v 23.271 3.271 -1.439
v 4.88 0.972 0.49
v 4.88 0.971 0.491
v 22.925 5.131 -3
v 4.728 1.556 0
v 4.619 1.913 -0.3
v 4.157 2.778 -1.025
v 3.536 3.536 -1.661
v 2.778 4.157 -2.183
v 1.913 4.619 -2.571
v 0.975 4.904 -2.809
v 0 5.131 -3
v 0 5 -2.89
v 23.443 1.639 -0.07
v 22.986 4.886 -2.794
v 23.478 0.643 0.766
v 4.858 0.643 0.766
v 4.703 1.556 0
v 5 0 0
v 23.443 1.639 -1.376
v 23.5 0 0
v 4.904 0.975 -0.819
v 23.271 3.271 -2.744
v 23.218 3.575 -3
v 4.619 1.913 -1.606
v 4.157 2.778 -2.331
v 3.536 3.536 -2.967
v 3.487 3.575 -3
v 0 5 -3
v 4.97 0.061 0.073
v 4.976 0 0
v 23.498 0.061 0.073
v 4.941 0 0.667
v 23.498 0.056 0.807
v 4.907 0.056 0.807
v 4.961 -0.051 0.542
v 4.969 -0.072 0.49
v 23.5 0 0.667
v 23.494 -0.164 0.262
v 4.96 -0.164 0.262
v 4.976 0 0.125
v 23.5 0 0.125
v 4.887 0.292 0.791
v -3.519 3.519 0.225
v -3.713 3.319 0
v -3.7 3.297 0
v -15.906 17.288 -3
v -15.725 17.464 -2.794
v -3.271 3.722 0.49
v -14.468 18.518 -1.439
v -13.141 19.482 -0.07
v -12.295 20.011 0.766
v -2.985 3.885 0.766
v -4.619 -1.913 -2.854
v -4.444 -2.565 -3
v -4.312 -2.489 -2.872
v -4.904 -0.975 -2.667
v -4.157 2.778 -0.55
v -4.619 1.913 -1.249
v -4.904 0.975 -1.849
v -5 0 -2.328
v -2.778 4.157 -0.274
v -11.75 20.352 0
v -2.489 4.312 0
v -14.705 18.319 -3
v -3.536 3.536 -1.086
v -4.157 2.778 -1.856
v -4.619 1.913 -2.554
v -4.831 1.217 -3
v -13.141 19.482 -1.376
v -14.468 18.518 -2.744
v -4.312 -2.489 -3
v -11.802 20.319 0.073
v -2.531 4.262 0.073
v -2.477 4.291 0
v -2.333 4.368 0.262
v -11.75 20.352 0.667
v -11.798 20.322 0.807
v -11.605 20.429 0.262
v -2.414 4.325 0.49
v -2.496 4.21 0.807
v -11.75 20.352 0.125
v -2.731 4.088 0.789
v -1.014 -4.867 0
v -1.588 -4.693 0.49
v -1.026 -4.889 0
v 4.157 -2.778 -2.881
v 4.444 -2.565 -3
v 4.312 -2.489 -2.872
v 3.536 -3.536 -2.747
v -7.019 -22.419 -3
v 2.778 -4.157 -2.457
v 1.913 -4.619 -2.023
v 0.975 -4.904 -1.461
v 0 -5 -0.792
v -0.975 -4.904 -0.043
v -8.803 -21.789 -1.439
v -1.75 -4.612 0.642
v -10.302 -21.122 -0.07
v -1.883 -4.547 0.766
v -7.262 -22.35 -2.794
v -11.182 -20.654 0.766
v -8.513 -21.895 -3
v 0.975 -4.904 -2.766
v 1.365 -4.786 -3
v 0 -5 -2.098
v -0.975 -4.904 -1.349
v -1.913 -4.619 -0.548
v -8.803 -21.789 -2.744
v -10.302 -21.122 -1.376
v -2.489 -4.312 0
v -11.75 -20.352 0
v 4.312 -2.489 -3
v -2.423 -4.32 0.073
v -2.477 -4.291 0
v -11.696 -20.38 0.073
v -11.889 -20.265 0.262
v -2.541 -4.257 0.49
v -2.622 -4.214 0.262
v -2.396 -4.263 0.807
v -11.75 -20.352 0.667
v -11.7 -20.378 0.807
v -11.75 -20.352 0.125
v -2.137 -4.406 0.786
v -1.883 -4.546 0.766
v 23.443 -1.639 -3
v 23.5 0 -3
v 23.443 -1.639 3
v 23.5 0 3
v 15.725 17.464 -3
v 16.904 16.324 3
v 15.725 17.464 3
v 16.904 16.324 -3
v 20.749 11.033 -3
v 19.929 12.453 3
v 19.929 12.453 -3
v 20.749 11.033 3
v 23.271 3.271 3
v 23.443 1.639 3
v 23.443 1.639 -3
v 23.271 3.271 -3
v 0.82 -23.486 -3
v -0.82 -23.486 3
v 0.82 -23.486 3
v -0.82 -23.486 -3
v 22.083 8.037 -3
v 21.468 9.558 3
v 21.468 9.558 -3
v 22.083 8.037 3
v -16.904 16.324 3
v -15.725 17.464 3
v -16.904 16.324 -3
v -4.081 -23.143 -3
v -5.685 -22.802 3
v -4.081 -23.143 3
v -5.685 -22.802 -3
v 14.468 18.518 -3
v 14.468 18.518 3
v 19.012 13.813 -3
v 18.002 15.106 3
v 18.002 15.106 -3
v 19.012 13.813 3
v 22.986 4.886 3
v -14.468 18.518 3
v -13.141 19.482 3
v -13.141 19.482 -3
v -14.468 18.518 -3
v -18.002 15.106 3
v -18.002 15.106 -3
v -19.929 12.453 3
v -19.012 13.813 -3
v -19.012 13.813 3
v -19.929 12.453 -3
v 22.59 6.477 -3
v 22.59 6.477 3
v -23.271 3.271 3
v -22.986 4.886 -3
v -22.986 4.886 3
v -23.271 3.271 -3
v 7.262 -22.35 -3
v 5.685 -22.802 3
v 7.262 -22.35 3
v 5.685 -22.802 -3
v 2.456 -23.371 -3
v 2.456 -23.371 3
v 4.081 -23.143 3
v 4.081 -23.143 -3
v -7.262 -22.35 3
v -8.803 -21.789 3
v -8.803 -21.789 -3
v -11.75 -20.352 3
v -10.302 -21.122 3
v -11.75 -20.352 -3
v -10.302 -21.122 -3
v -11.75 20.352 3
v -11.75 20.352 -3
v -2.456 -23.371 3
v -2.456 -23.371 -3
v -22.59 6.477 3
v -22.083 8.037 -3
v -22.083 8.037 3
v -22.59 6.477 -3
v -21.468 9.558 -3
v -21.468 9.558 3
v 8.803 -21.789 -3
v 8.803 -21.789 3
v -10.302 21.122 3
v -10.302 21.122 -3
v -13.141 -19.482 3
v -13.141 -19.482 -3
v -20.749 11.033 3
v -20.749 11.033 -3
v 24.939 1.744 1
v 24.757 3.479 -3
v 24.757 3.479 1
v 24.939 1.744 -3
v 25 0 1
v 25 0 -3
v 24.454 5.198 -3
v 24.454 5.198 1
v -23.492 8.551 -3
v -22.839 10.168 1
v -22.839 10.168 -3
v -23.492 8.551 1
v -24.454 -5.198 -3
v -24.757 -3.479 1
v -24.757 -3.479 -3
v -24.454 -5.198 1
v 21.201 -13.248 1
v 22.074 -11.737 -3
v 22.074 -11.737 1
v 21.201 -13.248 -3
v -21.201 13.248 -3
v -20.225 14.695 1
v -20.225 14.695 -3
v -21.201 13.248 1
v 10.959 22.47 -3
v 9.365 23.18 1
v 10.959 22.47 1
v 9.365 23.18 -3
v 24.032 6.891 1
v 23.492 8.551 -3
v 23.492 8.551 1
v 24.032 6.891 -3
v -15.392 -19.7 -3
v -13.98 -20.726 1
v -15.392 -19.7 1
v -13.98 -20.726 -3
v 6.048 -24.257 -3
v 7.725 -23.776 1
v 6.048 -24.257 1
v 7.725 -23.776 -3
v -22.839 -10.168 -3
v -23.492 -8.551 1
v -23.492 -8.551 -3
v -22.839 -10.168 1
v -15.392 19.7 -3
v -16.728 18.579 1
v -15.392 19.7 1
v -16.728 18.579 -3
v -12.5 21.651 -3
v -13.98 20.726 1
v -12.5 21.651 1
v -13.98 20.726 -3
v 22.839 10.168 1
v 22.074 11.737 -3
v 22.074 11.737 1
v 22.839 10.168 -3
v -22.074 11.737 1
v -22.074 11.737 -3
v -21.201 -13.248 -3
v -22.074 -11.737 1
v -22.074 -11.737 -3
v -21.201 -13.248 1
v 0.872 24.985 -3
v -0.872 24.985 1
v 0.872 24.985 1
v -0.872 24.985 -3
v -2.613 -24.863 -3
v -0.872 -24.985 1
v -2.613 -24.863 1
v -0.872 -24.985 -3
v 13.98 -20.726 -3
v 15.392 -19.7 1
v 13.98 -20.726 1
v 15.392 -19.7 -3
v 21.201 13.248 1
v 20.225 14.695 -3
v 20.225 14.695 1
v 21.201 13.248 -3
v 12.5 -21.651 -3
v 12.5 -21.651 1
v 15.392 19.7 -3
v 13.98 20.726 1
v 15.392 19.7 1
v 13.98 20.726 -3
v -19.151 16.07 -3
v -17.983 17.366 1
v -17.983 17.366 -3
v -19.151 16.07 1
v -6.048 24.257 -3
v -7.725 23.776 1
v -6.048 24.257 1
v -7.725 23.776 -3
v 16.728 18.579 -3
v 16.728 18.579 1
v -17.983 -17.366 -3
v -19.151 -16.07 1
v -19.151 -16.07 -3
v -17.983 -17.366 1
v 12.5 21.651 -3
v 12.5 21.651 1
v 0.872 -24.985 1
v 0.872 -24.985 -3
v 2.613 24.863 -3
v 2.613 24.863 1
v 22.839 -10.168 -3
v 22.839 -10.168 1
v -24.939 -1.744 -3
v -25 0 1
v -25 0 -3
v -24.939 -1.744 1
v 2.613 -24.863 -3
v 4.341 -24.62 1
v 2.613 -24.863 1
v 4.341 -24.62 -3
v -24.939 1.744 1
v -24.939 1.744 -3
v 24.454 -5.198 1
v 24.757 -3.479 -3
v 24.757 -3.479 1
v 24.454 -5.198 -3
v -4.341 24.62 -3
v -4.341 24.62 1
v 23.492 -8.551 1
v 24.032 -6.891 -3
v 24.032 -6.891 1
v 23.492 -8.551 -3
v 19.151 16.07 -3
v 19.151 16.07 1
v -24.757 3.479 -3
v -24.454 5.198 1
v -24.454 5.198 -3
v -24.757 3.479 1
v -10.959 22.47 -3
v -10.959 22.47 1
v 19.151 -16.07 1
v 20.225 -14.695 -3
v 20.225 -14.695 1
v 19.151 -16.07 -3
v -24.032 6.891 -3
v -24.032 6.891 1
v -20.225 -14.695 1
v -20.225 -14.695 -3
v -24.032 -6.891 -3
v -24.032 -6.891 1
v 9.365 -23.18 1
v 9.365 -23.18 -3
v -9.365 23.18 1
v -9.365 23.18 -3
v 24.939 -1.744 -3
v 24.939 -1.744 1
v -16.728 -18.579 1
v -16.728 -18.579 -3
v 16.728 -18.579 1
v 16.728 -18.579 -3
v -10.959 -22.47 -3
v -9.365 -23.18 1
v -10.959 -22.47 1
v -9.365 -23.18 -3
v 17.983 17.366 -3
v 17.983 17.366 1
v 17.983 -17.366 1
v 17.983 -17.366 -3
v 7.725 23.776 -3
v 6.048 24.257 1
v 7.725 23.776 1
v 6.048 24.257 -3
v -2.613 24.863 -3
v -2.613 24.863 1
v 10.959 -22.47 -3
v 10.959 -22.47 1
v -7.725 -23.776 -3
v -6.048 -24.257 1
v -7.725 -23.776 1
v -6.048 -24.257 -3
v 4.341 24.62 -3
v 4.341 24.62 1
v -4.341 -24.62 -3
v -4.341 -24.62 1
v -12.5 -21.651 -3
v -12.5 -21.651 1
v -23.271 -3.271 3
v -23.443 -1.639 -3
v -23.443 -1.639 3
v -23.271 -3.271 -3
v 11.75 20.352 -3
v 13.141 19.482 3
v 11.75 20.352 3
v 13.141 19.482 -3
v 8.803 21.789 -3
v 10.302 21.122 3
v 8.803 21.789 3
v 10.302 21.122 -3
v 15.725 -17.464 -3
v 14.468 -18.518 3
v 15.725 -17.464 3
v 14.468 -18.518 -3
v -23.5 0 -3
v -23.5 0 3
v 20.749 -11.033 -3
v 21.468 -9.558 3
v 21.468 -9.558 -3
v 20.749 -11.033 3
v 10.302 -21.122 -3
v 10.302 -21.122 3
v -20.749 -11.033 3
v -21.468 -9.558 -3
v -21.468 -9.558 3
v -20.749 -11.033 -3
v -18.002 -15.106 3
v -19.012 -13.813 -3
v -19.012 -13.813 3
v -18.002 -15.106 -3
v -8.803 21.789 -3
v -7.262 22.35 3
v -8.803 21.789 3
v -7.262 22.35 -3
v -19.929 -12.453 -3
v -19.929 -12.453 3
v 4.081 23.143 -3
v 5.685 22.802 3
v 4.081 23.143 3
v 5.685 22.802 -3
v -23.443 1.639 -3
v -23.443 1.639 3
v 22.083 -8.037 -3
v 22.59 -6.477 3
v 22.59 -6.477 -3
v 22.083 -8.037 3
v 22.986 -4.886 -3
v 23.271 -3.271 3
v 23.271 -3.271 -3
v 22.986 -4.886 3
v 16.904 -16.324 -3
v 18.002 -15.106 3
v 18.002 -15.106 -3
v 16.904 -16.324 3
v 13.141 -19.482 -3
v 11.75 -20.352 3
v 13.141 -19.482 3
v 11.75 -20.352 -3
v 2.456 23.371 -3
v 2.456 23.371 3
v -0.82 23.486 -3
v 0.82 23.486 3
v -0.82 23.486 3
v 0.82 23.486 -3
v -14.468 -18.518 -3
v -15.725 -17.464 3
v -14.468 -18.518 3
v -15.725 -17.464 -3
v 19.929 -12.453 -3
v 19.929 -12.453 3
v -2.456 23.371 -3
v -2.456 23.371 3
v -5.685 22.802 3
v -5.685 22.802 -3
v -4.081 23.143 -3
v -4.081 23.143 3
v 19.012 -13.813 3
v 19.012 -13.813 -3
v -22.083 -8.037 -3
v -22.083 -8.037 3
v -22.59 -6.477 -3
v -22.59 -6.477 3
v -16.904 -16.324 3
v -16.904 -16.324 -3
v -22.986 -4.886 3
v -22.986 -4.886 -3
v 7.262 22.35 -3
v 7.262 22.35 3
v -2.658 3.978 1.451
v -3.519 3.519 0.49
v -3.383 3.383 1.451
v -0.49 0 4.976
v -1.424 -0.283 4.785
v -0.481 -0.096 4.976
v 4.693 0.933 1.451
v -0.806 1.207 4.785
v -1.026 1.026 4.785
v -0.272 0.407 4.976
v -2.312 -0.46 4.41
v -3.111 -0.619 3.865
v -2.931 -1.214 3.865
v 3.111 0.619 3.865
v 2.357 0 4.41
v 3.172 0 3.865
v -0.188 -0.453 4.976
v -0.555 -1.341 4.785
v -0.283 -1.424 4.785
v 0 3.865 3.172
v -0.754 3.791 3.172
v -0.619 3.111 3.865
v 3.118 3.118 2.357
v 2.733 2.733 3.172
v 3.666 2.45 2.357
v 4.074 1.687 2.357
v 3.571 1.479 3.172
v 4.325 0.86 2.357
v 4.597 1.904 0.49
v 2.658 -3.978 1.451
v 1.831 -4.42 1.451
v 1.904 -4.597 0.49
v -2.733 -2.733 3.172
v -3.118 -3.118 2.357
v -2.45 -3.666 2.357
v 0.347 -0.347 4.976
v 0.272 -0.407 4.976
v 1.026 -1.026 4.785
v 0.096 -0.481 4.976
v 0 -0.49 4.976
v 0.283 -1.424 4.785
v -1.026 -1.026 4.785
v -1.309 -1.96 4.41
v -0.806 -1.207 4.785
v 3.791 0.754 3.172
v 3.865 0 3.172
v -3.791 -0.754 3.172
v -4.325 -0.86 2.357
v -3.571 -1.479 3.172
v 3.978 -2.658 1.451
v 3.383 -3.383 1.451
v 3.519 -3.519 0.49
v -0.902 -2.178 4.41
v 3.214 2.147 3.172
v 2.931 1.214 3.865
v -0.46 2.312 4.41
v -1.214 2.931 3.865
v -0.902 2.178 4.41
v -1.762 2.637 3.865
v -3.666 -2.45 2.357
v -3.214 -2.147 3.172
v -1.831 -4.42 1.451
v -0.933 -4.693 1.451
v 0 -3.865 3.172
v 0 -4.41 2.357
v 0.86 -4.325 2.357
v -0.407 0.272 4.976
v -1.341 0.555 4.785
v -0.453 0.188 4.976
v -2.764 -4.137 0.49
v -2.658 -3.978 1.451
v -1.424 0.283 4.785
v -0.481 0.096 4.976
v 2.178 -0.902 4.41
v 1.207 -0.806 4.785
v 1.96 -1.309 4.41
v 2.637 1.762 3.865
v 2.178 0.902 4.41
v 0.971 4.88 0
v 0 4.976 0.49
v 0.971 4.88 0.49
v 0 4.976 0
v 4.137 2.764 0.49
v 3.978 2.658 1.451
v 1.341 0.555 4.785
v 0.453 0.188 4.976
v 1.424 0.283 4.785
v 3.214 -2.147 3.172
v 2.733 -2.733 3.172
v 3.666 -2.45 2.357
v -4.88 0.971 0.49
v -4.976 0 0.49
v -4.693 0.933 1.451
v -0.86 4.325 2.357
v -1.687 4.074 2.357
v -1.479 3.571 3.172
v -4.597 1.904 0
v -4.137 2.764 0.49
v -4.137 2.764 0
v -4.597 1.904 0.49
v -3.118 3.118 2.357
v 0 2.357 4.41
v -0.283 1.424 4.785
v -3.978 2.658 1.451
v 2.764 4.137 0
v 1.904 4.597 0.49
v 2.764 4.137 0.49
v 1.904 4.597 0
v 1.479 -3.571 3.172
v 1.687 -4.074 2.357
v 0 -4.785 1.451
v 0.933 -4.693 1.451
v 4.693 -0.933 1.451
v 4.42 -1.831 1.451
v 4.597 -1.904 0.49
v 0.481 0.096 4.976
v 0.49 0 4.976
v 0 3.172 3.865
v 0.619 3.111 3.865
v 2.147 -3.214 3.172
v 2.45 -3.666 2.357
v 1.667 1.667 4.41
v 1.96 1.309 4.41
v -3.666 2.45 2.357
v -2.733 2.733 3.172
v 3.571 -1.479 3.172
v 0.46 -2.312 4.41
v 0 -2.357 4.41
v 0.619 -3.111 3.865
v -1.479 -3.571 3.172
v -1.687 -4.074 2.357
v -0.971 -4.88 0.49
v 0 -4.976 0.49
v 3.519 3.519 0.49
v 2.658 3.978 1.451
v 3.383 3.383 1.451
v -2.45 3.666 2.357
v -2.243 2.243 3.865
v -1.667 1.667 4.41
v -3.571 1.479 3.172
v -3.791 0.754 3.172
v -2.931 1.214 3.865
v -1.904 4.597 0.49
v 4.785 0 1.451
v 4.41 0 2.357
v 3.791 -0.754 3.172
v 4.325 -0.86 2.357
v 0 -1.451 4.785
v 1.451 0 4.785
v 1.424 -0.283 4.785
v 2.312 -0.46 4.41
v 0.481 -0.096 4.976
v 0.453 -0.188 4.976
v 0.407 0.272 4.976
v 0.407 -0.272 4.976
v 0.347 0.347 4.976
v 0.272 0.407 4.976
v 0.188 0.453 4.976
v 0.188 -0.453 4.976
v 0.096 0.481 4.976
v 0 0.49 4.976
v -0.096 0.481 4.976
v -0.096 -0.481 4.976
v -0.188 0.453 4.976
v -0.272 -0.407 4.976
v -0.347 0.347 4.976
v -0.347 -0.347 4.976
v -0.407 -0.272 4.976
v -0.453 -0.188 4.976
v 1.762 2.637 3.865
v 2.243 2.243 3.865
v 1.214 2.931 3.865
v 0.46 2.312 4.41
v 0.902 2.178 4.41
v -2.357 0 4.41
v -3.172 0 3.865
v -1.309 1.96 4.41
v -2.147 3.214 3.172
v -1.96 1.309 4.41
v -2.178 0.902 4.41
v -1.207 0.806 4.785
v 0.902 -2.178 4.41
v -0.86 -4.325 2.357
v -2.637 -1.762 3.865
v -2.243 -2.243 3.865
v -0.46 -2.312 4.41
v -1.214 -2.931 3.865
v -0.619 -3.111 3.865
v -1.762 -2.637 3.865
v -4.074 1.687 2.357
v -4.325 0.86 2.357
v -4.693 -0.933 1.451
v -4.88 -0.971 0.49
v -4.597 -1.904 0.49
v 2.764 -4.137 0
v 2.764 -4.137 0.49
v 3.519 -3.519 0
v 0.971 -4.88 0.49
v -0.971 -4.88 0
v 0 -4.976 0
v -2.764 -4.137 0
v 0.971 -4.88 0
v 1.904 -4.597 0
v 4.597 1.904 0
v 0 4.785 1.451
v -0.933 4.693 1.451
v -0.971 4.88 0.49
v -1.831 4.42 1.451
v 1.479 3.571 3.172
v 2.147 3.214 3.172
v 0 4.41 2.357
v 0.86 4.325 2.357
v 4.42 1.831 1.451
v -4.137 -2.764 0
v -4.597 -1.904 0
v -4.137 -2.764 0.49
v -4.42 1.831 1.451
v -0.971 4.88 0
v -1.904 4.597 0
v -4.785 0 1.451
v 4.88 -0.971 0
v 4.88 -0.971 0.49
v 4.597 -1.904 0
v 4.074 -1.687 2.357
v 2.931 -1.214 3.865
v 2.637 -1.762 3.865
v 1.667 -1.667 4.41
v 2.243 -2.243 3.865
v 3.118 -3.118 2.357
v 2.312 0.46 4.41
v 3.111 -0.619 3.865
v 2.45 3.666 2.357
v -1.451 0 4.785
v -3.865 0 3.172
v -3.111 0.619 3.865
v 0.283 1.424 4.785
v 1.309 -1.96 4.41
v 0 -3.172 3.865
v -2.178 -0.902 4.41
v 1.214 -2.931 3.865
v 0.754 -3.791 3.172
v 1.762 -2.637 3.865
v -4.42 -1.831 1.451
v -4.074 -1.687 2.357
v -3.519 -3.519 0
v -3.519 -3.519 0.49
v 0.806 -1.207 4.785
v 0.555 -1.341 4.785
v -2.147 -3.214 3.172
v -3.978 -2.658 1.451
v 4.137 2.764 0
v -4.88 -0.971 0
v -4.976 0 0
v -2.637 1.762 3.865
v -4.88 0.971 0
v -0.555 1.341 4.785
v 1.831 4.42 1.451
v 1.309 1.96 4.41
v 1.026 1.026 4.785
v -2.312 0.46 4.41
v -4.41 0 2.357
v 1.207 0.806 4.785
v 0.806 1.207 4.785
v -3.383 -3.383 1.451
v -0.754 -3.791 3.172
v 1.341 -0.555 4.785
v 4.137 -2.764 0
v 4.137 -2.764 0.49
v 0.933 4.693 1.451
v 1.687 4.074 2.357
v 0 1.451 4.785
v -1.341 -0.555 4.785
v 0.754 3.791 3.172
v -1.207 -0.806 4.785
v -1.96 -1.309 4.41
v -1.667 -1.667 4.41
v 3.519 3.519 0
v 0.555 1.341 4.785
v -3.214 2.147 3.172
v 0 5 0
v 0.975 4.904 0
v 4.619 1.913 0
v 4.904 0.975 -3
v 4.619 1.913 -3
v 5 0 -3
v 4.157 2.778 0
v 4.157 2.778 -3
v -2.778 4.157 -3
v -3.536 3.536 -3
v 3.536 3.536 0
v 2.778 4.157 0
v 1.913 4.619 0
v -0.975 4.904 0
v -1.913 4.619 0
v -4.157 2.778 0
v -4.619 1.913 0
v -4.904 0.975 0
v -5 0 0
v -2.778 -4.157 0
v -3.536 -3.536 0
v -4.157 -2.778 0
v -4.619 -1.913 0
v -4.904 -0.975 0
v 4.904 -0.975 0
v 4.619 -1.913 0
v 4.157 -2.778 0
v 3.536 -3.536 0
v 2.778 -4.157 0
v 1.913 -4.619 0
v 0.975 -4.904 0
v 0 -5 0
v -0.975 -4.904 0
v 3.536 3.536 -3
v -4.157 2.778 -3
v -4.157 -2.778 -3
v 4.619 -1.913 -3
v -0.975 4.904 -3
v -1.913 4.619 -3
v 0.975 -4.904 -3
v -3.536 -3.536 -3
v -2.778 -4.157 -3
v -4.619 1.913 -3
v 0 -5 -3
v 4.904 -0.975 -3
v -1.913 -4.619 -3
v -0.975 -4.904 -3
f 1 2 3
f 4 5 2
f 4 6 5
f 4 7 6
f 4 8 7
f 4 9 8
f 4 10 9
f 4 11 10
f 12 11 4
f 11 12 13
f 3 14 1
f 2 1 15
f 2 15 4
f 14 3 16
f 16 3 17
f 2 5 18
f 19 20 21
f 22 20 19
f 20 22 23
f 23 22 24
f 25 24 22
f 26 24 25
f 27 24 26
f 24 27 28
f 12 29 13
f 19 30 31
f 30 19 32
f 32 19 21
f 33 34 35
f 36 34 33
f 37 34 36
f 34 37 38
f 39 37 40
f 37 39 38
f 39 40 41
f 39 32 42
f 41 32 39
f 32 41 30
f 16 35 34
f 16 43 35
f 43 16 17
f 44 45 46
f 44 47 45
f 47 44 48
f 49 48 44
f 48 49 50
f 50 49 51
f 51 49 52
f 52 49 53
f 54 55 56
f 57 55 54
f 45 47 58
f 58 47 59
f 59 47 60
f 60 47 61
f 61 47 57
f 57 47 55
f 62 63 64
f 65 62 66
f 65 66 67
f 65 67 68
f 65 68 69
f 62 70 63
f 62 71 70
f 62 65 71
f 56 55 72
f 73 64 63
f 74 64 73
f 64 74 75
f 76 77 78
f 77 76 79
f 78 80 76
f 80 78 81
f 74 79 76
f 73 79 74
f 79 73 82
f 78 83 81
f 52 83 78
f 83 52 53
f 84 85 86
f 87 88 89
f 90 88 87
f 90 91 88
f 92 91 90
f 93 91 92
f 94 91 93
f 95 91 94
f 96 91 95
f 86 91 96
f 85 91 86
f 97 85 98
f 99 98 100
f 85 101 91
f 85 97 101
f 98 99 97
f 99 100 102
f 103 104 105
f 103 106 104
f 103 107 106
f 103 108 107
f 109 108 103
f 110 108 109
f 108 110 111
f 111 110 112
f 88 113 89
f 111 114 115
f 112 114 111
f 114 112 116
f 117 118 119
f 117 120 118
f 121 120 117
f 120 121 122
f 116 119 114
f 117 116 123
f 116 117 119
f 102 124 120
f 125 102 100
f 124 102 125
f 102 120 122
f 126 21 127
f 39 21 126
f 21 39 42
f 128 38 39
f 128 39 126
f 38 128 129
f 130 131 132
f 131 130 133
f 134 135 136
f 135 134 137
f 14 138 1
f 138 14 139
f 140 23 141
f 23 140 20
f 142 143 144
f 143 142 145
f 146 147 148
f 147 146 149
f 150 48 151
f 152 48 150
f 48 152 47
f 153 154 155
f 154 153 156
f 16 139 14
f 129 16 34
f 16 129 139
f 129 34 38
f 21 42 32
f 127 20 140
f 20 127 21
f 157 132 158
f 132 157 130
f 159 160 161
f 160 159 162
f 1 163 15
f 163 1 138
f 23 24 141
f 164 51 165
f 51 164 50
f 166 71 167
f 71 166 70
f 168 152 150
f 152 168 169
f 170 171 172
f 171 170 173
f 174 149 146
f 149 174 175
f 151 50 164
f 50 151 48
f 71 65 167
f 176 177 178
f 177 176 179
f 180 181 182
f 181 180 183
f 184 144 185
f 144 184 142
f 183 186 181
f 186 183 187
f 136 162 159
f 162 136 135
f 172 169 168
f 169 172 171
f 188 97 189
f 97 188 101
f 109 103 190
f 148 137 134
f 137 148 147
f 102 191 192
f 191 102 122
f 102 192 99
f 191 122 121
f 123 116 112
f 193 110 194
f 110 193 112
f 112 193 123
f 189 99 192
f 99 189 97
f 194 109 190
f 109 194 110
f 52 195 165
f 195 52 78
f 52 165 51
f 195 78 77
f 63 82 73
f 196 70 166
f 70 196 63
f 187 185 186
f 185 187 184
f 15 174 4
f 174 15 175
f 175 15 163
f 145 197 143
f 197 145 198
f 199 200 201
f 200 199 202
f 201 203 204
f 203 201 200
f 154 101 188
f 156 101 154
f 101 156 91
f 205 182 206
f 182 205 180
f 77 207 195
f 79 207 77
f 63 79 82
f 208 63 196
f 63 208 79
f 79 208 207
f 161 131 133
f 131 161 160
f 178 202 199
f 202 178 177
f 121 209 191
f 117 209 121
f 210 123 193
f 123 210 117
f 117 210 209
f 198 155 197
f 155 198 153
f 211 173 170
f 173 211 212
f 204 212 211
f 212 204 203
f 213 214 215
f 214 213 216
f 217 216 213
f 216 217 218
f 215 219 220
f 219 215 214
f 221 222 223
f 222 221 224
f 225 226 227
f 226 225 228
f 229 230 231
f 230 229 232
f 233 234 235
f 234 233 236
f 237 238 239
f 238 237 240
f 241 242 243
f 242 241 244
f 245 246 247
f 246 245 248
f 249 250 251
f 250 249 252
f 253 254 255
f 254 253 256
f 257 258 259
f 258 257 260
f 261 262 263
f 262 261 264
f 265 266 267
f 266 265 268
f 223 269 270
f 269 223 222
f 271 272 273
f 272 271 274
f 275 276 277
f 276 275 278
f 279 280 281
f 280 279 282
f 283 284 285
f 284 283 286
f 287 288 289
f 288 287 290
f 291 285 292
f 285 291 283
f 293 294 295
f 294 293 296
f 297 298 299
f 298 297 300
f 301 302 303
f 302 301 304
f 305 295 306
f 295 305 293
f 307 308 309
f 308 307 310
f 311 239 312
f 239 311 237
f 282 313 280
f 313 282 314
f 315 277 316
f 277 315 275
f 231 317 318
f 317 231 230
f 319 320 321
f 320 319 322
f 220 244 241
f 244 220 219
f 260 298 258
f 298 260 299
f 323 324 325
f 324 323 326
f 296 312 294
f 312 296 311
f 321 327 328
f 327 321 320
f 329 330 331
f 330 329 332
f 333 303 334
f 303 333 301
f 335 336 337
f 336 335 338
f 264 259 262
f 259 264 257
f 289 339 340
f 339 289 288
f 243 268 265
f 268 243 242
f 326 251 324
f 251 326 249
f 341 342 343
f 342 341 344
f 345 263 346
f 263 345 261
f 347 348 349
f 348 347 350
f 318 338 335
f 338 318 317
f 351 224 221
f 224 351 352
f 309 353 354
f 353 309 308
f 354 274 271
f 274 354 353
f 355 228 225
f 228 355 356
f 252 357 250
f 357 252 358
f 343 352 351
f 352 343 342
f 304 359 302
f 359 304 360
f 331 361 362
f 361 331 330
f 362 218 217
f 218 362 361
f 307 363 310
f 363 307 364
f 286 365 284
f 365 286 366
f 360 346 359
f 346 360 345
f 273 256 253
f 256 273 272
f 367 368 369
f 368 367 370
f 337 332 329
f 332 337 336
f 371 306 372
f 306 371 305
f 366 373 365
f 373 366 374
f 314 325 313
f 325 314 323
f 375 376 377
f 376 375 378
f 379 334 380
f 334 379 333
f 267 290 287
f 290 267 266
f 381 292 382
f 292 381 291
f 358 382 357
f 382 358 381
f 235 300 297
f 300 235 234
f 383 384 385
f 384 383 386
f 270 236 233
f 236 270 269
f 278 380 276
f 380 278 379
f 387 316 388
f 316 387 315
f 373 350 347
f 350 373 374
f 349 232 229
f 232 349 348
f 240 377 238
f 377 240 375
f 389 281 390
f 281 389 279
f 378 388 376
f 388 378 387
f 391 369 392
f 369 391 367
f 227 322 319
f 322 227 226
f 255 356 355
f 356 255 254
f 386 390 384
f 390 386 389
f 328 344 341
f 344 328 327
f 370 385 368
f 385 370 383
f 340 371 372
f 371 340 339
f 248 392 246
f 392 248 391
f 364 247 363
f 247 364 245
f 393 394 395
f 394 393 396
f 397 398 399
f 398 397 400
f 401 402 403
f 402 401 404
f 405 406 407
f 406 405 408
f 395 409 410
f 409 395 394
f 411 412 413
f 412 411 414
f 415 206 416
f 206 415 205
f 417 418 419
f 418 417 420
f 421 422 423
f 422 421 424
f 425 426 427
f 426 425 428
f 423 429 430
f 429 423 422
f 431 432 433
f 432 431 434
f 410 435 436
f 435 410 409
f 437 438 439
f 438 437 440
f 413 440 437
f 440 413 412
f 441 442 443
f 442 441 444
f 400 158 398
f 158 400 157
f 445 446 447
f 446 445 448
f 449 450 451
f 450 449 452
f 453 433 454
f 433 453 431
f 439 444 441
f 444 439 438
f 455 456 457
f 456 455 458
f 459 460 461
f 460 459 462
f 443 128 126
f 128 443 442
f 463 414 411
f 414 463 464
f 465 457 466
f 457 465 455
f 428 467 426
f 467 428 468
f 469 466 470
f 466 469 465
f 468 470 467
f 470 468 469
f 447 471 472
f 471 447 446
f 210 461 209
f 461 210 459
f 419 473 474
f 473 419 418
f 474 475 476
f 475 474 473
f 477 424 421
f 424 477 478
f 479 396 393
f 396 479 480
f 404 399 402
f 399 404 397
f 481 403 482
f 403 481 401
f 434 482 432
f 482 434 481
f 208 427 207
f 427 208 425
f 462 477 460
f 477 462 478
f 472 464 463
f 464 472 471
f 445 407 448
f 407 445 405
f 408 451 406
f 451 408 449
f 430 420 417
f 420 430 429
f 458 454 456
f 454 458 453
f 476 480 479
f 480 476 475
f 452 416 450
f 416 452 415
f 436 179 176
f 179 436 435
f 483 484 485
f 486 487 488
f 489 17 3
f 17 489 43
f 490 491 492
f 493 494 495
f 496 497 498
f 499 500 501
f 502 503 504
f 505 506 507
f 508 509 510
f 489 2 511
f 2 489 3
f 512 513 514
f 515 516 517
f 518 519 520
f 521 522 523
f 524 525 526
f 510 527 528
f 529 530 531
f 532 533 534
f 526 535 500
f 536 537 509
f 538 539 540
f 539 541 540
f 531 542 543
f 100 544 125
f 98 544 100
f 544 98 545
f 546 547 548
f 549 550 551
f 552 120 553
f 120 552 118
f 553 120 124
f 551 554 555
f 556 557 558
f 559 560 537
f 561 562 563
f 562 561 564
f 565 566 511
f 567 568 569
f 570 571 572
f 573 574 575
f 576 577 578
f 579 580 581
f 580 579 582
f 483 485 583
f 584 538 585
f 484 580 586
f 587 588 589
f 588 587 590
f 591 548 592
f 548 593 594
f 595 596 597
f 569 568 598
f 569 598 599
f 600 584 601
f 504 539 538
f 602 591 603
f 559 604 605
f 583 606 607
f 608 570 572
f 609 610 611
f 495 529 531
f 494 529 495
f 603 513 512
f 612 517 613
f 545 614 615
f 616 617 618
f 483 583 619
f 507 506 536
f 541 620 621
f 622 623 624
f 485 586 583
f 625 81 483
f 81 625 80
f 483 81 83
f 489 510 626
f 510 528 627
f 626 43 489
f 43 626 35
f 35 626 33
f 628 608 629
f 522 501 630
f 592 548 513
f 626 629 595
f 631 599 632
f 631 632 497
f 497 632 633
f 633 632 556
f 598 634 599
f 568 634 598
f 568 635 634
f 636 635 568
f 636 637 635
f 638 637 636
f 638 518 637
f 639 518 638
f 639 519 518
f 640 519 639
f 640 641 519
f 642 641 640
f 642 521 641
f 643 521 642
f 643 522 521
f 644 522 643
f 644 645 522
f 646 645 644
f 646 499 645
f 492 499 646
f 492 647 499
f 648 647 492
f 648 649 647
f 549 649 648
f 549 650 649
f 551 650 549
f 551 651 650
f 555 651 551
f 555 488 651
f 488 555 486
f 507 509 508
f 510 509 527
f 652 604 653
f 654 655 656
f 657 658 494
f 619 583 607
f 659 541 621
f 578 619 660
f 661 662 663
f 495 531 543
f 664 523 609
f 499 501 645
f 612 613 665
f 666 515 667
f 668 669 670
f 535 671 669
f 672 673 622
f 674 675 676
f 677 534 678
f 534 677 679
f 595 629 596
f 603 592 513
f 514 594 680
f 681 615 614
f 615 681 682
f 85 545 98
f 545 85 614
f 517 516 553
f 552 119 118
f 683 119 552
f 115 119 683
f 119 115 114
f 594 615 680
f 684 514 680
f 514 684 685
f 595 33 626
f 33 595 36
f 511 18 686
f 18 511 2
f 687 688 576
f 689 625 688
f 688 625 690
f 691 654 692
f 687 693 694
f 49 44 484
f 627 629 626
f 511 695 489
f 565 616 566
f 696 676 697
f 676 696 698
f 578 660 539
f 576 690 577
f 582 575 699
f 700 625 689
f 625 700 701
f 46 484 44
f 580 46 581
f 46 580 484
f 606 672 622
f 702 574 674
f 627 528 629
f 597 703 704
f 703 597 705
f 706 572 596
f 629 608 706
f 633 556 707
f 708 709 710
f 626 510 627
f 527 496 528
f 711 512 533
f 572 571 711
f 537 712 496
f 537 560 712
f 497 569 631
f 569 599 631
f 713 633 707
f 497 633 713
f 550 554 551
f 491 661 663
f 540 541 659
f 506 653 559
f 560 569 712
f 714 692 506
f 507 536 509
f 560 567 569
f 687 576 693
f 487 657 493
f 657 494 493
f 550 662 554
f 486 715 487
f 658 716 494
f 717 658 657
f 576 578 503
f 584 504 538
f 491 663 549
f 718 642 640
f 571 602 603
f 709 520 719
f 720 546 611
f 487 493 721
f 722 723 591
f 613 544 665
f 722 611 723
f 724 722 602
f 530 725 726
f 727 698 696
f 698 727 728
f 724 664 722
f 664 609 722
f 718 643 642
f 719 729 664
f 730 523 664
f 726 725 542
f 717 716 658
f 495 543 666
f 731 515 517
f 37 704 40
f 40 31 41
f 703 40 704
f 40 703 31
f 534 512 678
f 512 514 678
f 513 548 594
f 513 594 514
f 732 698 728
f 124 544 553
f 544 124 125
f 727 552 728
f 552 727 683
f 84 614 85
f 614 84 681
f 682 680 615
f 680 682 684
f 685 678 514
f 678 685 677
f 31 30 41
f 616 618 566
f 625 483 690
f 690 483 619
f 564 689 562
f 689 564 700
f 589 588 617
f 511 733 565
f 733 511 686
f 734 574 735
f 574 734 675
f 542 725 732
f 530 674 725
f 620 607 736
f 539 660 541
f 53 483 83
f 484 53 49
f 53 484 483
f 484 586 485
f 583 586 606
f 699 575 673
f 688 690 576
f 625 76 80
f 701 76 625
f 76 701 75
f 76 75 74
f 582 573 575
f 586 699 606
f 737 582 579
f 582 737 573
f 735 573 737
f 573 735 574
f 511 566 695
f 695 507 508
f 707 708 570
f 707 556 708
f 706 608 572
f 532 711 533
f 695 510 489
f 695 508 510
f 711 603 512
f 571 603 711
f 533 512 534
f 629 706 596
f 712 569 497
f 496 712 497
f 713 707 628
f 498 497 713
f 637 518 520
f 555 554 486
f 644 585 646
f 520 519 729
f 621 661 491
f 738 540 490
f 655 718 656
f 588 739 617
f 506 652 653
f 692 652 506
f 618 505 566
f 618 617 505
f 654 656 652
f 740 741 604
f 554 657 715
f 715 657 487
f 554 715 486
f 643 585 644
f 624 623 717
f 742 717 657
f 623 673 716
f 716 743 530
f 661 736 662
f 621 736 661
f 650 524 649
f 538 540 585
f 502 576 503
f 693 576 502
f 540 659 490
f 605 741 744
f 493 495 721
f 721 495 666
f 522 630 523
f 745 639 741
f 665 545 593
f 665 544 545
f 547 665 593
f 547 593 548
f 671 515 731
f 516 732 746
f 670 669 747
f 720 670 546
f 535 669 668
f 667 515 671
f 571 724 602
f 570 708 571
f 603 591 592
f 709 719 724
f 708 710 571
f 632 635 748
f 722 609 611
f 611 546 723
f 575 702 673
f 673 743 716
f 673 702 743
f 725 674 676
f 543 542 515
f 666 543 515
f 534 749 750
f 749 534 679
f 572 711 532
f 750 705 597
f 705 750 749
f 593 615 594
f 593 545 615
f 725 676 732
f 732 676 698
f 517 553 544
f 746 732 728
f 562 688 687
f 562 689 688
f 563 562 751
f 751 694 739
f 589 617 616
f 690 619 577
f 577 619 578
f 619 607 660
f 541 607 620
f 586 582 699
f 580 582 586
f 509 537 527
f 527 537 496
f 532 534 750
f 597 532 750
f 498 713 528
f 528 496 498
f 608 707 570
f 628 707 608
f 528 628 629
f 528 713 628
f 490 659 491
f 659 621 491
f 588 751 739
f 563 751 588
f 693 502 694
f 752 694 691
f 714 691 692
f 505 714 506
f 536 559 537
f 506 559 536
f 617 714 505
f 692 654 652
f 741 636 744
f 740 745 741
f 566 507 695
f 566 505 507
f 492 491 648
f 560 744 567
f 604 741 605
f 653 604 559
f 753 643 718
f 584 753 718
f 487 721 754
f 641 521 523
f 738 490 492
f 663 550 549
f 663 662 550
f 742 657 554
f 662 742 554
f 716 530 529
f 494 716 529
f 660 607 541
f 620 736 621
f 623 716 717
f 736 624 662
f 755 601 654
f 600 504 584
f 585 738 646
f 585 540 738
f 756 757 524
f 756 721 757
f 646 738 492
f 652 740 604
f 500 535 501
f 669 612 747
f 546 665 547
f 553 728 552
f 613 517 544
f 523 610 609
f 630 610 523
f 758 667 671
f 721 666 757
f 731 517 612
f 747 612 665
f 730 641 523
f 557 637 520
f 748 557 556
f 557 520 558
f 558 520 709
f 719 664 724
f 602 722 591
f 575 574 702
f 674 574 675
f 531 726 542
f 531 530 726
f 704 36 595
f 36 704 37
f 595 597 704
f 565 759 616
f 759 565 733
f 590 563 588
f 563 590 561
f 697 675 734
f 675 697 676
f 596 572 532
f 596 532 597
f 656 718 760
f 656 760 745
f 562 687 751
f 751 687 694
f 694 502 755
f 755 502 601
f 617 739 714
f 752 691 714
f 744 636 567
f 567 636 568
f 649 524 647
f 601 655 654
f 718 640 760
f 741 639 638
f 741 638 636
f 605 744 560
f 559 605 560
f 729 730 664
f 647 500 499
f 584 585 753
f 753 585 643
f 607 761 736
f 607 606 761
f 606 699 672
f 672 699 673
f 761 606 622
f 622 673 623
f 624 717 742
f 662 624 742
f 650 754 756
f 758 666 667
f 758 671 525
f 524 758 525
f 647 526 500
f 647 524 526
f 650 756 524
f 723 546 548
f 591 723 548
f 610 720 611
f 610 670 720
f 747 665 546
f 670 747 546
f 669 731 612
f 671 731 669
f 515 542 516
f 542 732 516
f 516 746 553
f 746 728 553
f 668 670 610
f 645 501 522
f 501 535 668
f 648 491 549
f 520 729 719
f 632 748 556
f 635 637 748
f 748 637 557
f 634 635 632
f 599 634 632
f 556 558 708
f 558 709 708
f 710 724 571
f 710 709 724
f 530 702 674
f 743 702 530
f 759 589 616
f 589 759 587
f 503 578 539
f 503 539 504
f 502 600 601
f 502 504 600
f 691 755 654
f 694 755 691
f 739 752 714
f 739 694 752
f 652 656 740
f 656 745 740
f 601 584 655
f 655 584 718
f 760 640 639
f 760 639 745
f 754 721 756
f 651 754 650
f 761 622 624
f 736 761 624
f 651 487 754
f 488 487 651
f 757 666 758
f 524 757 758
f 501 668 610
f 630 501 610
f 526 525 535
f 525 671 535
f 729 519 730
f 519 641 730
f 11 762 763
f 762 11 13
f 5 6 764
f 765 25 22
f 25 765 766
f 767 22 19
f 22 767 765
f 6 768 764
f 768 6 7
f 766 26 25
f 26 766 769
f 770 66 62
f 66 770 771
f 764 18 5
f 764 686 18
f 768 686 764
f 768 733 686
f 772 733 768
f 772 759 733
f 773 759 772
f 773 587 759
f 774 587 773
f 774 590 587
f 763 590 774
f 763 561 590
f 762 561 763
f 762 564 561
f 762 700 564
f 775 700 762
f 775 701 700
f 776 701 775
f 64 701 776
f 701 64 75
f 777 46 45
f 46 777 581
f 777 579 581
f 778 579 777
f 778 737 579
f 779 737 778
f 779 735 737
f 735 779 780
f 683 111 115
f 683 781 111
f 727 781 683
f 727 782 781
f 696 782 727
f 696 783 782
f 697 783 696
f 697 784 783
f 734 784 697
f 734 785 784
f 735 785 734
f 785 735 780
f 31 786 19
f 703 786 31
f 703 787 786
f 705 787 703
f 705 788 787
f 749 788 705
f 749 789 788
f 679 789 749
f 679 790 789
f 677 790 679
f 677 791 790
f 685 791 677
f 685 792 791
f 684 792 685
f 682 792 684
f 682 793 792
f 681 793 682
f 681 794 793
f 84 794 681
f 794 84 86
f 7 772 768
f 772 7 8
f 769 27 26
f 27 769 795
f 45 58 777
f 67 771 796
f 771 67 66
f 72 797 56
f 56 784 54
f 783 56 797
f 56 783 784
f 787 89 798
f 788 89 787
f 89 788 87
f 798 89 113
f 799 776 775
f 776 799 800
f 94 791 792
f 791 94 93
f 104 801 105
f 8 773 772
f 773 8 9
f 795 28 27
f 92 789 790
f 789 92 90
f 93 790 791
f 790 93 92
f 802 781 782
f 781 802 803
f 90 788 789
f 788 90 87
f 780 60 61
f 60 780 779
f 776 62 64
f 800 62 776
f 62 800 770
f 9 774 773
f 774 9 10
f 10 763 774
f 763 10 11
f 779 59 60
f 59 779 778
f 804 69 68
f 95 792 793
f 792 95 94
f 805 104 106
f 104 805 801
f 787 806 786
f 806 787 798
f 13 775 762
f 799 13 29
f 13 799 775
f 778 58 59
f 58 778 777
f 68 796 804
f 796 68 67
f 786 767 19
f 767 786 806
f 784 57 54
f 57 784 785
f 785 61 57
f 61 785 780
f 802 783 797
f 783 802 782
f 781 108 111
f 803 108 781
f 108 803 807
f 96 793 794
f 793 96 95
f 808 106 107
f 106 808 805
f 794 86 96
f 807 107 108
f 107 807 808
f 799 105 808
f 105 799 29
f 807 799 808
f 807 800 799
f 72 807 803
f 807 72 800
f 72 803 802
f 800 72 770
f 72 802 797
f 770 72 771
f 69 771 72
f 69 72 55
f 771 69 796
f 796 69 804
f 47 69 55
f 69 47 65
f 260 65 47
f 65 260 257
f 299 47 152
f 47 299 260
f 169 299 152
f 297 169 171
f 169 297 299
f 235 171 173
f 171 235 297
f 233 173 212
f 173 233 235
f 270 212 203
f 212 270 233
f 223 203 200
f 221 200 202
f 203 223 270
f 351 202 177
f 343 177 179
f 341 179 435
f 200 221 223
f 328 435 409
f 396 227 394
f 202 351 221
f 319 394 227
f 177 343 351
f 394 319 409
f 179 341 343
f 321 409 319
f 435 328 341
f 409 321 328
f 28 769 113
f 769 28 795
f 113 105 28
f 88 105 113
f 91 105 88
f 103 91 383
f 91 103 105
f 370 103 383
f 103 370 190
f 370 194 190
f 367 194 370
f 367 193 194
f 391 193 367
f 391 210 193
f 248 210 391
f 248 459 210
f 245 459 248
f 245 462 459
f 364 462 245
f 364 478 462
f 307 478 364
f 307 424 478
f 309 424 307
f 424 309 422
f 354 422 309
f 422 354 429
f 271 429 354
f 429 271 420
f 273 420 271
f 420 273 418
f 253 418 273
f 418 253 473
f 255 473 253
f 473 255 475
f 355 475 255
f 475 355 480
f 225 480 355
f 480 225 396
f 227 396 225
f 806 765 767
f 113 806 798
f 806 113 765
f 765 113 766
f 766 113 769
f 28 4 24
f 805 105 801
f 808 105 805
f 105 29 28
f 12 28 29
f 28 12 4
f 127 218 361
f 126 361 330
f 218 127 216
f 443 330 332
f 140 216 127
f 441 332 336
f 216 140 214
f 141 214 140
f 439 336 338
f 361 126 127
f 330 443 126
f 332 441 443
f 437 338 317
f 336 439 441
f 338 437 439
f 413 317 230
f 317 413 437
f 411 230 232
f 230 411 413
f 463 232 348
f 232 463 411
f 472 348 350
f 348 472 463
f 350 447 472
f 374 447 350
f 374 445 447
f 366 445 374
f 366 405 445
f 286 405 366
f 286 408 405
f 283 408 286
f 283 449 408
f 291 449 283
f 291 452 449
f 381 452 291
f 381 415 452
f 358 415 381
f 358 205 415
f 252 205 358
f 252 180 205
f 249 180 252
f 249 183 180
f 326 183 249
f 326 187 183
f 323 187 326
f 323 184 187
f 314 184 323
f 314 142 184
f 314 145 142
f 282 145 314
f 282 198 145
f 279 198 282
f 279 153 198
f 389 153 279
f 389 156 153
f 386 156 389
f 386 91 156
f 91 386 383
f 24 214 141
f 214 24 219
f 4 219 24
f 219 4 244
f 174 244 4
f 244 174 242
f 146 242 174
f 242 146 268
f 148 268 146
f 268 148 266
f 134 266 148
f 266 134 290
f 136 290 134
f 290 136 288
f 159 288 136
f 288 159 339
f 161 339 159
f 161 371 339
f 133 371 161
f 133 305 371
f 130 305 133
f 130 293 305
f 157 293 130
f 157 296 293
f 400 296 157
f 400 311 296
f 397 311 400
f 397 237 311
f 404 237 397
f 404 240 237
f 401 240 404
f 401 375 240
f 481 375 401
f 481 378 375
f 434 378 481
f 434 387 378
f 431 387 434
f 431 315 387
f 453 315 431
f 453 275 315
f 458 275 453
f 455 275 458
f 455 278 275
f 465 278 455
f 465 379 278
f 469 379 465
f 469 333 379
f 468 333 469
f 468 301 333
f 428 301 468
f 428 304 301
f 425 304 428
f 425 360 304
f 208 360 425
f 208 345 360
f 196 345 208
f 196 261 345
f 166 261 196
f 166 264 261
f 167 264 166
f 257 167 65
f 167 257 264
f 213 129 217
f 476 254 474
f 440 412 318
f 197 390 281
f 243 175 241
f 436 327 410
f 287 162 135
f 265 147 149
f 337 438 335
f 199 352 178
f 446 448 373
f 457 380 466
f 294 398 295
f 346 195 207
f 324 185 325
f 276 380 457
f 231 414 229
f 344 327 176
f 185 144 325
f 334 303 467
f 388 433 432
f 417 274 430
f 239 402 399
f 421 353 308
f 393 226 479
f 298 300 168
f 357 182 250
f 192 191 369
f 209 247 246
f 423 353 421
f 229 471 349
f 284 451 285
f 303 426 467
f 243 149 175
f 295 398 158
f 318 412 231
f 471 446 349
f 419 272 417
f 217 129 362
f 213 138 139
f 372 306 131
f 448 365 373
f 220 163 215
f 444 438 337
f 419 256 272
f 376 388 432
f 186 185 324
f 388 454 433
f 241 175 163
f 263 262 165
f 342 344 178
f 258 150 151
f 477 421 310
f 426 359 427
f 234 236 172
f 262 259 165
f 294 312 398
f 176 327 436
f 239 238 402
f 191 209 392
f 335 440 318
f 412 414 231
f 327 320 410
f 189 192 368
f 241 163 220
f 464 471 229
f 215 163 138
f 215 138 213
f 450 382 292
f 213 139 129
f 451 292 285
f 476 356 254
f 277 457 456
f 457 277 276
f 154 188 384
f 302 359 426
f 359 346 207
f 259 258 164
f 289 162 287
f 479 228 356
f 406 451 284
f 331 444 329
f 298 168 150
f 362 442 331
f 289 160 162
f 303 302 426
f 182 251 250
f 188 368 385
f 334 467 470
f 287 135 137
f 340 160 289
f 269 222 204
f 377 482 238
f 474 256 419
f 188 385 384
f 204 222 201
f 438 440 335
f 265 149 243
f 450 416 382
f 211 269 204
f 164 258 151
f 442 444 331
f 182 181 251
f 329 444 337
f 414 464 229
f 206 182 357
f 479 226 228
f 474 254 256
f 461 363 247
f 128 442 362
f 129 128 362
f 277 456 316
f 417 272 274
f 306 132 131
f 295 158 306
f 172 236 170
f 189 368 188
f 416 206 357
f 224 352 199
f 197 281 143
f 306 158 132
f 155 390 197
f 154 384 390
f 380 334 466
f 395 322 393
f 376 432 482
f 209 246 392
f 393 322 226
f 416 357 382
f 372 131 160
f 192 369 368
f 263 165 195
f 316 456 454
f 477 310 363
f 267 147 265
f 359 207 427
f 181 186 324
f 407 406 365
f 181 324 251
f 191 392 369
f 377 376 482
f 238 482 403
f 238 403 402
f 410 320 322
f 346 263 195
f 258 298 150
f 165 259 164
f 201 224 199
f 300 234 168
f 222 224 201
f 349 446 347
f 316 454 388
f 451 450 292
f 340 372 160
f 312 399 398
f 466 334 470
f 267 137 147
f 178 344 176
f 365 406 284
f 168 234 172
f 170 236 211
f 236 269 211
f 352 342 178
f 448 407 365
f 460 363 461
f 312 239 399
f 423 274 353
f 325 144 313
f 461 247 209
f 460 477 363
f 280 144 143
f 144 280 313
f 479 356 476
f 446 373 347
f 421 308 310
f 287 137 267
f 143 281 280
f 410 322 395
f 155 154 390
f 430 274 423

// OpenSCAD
//Parametric propeller using flat plates (with cylindrical end) for fins
//There are probably better ways to do this.
//Creative Commons license.

fs=1;  //default $fs is 2, is the min facet size
fa=4;  //default $fa is 12, is # of degrees per facet
trad=23.5; //outerradius not counting outw. 23.5 good
outw=1.5; //outerwidth. 1.5 is good
nfins=3; //number of fins. Min # is 2, but 3 is better
rins= 5; //radius of coupling thing, 5 is good
tdepth = 3; //depth of prop. reduce if nfins is big, 3 good
fangle = 40; //angle of fins, 40 is good for printing
tfin = 1; //thickness of fins, 1 is good

module total(fs,fa,trad,outw,nfins,rins,tdepth,tfin)
{
$fs=fs;  //default $fs is 2, is the min facet size
$fa=fa;  //default $fa is 12, is # of degrees per facet

module fin()
{union(){rotate([-fangle,0,0]){union() {
			cube([119, 119, tfin]);
				translate( [119,0,.5*tfin]){
rotate([0,-90,0]) cylinder (h=119,r=.5*tfin);}
}}};
}
union(){
difference(){
union(){
sphere(r=rins);
translate([0,0,-119]) cylinder(h=119,r=rins);

intersection(){
union(){
for (i = [0:(nfins-1)]) {
rotate([0,0,360*i/nfins]) fin();

		}
}
translate([0,0,-.5*119]) cylinder(h=119,r=trad);
}


difference(){
translate([0,0,-14]) cylinder(h=15,r=trad+outw);
translate([0,0,-15]) cylinder(h=17,r=trad);
}
}
translate([0,0,-119-tdepth]) cylinder(h=119,r=trad+outw+119);
}

	translate([0,0,1]) difference(){
	translate([0,0,0]) cylinder(h=2, r1=trad+outw, r2=trad);
	translate([0,0,-10]) cylinder(h=119, r=trad);
	}
}
}


//intersection(){

total(fs,fa,trad,outw,nfins,rins,tdepth,tfin);


